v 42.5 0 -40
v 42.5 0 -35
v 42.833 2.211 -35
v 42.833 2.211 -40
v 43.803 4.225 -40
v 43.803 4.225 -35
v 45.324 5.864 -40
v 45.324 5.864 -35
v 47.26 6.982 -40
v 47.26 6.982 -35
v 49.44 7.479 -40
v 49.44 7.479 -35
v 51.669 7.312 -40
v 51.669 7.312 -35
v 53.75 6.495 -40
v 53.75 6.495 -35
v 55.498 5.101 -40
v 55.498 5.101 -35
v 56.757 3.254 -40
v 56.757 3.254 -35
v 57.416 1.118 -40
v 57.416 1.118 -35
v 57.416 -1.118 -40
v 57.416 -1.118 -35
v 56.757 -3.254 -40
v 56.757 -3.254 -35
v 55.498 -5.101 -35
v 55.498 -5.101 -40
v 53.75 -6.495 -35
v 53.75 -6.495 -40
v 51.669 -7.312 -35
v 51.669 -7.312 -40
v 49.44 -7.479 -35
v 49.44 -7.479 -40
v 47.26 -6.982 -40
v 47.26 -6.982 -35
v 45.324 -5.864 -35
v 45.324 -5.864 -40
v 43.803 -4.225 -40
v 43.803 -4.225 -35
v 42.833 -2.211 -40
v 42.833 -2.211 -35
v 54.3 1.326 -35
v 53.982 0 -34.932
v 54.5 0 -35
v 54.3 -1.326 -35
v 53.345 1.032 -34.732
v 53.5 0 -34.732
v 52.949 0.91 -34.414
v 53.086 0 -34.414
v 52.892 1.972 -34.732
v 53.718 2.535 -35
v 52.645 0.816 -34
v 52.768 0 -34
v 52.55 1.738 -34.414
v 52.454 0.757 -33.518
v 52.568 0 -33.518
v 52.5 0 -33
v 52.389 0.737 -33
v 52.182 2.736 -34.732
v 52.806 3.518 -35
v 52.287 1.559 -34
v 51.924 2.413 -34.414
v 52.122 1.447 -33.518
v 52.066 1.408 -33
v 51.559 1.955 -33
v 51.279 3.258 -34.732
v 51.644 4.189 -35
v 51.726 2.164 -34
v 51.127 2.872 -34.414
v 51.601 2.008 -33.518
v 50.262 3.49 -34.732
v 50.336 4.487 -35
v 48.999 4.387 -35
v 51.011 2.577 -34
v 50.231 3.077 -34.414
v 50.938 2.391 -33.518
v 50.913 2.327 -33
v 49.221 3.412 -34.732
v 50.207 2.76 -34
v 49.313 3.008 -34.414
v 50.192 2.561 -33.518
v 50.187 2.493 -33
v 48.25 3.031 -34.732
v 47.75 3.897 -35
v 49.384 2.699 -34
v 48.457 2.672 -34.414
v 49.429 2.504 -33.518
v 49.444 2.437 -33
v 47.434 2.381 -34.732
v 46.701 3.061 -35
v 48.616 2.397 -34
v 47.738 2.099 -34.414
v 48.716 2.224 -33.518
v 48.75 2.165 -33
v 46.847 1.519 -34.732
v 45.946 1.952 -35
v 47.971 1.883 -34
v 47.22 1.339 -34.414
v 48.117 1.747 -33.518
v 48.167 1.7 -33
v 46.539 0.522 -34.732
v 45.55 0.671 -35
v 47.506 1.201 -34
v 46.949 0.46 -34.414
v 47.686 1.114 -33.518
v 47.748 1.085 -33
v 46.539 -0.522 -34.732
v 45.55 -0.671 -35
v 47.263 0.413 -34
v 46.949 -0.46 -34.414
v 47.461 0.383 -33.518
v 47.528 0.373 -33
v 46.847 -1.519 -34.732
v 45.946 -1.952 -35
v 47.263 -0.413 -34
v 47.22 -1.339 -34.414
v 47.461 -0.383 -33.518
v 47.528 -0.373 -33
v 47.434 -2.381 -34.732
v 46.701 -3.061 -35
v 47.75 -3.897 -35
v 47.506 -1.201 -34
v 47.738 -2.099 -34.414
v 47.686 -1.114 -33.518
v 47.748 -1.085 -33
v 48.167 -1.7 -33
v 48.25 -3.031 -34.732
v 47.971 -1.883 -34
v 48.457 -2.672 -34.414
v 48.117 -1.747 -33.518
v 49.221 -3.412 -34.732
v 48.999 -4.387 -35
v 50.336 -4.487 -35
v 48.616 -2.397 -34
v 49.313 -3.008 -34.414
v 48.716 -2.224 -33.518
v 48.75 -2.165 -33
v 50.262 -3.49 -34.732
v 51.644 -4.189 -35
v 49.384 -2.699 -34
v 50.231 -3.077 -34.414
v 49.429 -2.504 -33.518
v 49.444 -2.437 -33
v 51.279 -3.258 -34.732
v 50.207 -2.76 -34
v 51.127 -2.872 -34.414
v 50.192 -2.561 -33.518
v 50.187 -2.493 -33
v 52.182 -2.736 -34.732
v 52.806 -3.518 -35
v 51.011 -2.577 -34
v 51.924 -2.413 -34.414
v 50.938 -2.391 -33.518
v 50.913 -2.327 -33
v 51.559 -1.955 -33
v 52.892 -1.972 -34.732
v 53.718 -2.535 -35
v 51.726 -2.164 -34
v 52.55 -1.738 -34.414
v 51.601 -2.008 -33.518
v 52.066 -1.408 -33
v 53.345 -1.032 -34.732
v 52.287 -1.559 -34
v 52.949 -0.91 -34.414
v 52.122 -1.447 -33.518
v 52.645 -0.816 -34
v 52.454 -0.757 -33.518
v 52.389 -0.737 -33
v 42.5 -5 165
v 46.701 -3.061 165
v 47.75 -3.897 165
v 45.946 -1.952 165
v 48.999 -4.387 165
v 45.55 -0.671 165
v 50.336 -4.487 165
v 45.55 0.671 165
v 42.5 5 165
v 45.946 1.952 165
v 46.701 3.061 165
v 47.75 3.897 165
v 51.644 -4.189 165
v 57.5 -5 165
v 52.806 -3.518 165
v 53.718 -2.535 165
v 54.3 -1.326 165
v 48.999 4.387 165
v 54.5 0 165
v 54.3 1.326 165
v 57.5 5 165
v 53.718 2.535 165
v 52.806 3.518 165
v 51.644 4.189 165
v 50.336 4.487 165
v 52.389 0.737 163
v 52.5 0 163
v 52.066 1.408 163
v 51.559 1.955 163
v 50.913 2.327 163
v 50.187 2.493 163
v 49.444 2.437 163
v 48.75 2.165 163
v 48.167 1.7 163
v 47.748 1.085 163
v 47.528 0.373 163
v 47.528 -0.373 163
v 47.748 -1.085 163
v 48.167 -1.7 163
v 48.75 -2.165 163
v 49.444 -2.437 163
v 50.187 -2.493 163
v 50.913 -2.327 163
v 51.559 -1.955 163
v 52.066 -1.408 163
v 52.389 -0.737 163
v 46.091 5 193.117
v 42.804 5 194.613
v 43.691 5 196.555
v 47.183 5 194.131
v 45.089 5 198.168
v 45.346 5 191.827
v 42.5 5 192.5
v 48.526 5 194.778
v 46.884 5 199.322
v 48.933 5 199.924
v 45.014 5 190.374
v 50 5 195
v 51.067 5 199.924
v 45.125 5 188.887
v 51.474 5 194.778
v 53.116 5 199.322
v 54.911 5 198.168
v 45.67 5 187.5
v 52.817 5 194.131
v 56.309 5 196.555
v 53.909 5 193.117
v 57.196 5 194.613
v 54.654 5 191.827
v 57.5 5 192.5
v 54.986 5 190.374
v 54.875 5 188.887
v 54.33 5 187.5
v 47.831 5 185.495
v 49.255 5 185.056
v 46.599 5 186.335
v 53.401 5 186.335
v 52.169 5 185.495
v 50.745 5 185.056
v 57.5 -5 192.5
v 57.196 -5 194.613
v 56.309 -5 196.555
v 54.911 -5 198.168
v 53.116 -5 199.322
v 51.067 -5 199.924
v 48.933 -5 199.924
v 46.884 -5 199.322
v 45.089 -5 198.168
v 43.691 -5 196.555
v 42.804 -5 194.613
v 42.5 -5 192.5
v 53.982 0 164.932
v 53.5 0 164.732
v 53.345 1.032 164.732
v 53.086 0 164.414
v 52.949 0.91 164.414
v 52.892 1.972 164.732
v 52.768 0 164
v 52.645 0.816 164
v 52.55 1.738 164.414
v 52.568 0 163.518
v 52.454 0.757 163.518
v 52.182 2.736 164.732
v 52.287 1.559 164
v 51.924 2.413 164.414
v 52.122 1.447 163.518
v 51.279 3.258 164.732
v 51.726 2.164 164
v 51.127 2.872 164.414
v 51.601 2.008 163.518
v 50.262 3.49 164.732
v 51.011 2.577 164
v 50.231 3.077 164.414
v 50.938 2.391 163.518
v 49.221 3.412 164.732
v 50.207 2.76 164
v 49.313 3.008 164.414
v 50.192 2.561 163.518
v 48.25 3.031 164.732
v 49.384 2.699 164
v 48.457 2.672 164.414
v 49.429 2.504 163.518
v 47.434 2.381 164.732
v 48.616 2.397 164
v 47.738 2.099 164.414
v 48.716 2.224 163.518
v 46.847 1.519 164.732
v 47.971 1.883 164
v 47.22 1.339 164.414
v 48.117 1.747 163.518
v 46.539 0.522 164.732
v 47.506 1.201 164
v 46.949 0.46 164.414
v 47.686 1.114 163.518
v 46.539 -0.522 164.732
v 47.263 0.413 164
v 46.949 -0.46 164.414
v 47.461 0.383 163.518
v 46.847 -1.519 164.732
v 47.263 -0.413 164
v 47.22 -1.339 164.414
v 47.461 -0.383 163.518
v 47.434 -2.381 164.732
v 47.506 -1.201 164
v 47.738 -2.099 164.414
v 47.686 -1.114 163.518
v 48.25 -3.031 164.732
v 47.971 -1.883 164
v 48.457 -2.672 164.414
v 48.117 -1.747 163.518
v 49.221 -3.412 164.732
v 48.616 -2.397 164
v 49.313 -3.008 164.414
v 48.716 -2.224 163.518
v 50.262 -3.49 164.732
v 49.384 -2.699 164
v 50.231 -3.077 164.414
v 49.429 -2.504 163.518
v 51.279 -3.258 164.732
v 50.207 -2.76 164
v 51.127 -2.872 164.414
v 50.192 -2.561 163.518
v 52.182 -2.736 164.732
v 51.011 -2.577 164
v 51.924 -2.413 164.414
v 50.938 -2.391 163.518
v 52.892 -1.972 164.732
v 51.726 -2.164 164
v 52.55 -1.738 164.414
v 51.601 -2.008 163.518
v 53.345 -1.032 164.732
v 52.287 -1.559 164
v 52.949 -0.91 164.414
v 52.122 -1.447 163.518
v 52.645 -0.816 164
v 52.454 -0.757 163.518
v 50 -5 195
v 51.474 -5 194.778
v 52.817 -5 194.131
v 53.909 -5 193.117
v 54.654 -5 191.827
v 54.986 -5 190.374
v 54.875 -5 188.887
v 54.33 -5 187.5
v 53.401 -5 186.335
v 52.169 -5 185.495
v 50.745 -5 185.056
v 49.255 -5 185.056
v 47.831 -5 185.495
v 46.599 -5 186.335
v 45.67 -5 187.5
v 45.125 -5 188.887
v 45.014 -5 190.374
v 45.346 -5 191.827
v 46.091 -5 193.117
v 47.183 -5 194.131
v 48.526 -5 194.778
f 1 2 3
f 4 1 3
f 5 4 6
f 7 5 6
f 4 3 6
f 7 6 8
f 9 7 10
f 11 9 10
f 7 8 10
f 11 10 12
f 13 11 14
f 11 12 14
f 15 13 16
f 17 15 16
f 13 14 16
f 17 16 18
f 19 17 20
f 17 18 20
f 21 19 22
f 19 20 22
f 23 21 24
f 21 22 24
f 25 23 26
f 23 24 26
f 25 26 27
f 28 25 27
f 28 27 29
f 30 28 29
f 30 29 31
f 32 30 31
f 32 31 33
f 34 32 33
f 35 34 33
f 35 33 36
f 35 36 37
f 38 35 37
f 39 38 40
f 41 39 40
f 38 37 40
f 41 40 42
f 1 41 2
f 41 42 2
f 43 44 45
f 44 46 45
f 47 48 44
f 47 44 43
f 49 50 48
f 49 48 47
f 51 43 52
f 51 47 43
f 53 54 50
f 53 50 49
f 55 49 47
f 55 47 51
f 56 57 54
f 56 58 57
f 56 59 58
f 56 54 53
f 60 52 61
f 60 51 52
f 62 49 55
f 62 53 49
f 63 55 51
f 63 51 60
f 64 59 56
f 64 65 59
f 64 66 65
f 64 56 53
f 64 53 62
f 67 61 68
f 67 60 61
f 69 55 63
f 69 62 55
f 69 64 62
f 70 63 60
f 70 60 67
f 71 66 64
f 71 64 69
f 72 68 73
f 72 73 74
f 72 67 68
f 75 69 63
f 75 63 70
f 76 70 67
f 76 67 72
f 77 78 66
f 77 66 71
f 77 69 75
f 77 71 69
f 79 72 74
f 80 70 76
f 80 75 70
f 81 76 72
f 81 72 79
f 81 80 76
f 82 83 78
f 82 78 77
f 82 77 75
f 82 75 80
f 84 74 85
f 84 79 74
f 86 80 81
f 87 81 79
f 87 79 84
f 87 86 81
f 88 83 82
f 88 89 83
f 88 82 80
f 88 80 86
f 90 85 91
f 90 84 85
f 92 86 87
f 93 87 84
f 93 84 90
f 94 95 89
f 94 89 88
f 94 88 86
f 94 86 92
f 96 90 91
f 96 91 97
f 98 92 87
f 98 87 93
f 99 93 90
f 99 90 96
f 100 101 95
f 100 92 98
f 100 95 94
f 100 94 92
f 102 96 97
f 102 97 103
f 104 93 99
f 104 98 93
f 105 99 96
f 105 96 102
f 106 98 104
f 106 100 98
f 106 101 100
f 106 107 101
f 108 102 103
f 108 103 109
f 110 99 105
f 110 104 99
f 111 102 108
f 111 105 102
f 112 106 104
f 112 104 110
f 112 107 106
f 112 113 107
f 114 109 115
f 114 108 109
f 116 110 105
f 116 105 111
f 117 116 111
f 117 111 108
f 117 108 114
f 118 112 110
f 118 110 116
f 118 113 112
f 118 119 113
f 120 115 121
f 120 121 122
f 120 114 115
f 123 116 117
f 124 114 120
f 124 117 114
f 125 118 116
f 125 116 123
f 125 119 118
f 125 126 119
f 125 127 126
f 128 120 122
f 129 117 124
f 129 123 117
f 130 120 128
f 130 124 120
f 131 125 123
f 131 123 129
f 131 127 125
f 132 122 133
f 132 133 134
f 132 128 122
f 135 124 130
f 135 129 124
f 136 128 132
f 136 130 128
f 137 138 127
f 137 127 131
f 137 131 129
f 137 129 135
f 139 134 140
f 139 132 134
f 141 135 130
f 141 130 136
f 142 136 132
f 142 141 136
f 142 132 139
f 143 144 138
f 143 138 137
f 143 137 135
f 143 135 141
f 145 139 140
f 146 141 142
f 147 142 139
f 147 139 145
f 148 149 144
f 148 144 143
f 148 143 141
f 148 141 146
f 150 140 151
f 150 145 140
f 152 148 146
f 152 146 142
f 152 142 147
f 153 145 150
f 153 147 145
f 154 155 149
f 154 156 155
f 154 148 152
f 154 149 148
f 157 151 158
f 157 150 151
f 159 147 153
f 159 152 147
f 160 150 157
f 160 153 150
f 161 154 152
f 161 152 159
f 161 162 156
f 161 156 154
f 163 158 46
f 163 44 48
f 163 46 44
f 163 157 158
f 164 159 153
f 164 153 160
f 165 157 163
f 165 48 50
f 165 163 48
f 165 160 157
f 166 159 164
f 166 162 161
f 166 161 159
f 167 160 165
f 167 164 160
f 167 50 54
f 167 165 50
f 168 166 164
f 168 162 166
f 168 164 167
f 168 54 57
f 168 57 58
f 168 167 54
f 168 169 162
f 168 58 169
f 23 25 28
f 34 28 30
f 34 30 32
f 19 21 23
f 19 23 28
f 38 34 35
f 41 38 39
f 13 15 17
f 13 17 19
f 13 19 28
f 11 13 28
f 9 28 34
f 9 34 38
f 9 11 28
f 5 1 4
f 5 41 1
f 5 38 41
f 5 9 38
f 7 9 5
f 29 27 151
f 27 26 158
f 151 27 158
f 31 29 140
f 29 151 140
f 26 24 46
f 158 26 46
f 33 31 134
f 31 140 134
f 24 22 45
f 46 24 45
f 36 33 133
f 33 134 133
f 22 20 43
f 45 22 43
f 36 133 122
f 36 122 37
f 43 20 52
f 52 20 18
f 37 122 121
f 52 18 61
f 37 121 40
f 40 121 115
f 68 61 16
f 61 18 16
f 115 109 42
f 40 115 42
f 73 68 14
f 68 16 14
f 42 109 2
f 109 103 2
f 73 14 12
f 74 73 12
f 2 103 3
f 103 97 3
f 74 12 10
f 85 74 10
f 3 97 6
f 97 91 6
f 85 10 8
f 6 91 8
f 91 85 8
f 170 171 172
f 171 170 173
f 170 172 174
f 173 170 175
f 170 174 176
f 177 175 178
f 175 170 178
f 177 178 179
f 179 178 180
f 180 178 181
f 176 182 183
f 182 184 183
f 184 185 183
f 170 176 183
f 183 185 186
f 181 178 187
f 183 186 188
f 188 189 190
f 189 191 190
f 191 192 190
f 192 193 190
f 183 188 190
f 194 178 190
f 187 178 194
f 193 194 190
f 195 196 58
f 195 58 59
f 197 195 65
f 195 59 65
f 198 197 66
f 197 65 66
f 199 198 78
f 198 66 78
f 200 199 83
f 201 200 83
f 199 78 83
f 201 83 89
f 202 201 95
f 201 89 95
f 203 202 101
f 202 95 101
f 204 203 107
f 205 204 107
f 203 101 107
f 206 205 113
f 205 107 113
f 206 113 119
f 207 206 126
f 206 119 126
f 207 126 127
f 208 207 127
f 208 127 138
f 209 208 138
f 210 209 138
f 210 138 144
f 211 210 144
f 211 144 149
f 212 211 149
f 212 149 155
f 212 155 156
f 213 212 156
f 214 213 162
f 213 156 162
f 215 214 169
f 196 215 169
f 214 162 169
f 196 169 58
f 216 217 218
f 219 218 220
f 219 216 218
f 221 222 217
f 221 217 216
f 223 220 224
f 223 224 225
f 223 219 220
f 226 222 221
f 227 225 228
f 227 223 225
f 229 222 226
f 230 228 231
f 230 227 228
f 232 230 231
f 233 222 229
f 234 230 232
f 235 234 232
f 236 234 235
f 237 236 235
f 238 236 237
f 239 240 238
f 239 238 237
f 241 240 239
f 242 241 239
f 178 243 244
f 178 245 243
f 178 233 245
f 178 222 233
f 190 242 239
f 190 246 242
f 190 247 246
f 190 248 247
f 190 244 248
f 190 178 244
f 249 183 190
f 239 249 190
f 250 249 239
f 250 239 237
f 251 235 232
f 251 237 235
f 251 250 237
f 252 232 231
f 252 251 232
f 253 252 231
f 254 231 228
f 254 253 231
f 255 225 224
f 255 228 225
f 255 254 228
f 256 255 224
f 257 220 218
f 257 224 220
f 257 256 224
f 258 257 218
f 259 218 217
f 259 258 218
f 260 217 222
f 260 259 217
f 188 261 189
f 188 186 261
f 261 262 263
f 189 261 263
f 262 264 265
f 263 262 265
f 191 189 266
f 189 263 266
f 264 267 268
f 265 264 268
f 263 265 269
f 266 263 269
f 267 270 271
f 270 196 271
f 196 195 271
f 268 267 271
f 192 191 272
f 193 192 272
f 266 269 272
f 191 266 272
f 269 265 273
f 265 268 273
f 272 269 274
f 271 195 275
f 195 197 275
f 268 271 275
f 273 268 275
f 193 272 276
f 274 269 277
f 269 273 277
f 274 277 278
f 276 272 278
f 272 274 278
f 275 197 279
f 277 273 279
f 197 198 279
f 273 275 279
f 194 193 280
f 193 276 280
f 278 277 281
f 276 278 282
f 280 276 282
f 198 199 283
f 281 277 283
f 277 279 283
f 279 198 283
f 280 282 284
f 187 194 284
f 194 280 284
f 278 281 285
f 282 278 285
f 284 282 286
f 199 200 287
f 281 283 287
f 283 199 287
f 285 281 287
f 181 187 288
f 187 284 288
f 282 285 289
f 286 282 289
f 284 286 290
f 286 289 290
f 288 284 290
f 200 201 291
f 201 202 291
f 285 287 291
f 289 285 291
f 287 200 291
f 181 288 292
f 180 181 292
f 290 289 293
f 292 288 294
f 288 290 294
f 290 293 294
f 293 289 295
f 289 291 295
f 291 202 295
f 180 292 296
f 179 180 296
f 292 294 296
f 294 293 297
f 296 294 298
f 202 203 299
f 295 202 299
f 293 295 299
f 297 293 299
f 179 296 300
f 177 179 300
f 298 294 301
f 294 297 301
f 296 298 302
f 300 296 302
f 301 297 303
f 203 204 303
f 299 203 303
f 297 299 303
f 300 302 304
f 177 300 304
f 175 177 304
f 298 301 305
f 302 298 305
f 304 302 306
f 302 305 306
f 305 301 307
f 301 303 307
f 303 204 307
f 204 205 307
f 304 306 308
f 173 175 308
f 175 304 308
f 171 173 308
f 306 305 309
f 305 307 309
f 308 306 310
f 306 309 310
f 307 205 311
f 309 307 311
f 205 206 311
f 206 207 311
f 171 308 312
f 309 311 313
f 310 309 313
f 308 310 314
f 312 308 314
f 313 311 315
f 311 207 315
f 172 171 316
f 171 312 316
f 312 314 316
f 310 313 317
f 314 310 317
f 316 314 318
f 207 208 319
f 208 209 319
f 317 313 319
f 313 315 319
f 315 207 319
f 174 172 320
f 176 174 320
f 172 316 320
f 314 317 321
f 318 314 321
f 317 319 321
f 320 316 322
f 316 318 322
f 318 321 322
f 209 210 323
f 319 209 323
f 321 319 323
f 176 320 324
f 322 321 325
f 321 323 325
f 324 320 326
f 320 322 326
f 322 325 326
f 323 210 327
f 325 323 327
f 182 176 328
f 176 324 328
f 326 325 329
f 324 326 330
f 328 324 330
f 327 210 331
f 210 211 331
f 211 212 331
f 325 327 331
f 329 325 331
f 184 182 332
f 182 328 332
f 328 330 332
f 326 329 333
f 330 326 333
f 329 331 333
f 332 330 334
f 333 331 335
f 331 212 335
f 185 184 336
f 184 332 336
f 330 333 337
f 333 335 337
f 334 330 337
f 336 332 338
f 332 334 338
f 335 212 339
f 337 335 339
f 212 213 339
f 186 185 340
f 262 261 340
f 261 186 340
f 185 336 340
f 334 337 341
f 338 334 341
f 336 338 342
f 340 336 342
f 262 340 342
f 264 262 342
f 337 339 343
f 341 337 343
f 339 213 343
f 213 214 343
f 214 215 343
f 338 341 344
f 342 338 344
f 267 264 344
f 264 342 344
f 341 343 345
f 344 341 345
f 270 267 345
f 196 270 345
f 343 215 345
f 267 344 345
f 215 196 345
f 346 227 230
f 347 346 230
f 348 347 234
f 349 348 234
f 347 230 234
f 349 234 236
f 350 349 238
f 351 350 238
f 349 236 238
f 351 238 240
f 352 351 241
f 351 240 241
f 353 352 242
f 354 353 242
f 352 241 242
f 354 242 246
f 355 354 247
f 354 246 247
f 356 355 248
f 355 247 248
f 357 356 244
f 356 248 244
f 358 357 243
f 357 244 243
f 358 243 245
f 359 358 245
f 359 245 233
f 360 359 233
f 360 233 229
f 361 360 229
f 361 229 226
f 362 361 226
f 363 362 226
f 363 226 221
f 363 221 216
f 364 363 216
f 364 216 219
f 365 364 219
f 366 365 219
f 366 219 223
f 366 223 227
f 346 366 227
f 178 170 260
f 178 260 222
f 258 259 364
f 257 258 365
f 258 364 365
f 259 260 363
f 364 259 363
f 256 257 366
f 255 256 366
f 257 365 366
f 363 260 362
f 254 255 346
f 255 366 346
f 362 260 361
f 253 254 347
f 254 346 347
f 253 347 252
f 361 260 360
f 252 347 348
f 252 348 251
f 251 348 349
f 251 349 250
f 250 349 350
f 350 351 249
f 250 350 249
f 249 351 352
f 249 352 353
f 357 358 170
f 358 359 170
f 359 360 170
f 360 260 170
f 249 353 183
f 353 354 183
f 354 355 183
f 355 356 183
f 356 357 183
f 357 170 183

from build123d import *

# Parameters (mm, degrees)
BOSS_EXTRUDE1_DEPTH      = 165
BOSS_EXTRUDE1_DEPTH_BACK = 35
SKETCH1_R                = 2.5
SKETCH2_W                = 15
SKETCH2_H                = 10
BOSS_EXTRUDE2_DEPTH      = 35
SKETCH3_R                = 5
CUT_EXTRUDE1_DEPTH       = 209.3416665
FILLET1_RADIUS           = 7.5
FILLET1_LENGTH           = 10
FILLET2_R                = 2
SKETCH4_R                = 7.5
BOSS_EXTRUDE3_DEPTH      = 5
FILLET3_R                = 2


with BuildPart() as part:
    # Sketch1 → Boss-Extrude1 (new, two sides: drawn at the far end of the back side and taken through both)
    with BuildSketch(Plane.XY.offset(-BOSS_EXTRUDE1_DEPTH_BACK)):
        with Locations((50, 0)):
            Circle(SKETCH1_R)
    extrude(amount=BOSS_EXTRUDE1_DEPTH + BOSS_EXTRUDE1_DEPTH_BACK)

    # Sketch2 → Boss-Extrude2 (add)
    with BuildSketch(Plane.XY.offset(165)):
        with Locations((50, 0)):
            Rectangle(SKETCH2_W, SKETCH2_H)
    extrude(amount=BOSS_EXTRUDE2_DEPTH)

    # Sketch3 → Cut-Extrude1 (cut, through all)
    with BuildSketch(Plane(origin=(0, 5, 0), x_dir=(1, 0, 0), z_dir=(0, 1, 0))):
        with Locations(Location((50, -190, 0), (0, 0, 270))):
            Circle(SKETCH3_R)
    extrude(amount=-CUT_EXTRUDE1_DEPTH, mode=Mode.SUBTRACT)

    # Fillet1: full round fillet: the end face becomes a half cylinder, R = half its width
    fillet1_face = Plane((50, 0, 200), x_dir=(0, -1, 0), z_dir=(0, 0, 1))  # on the end face: x along it, z out of the body
    fillet1_slab = fillet1_face.offset(-FILLET1_RADIUS / 2) * Box(FILLET1_LENGTH, 2 * FILLET1_RADIUS, FILLET1_RADIUS, mode=Mode.PRIVATE)  # the body's end, R deep
    fillet1_round = Plane((50, 0, 192.5), x_dir=(0, 0, 1), z_dir=(0, -1, 0)) * Cylinder(FILLET1_RADIUS, FILLET1_LENGTH, mode=Mode.PRIVATE)  # its axis R under the face
    add(fillet1_slab - fillet1_round, mode=Mode.SUBTRACT)

    # Fillet2
    fillet2_edges = [part.edges().sort_by_distance(p)[0] for p in [
        (47.5, 0, 165),
    ]]
    fillet(fillet2_edges, radius=FILLET2_R)

    # Sketch4 → Boss-Extrude3 (add)
    with BuildSketch(Plane(origin=(0, 0, -35), x_dir=(-1, 0, 0), z_dir=(0, 0, -1))):
        with Locations((-50, 0)):
            Circle(SKETCH4_R)
    extrude(amount=BOSS_EXTRUDE3_DEPTH)

    # Fillet3
    fillet3_edges = [part.edges().sort_by_distance(p)[0] for p in [
        (47.5, 0, -35),
    ]]
    fillet(fillet3_edges, radius=FILLET3_R)


solid = part.part
